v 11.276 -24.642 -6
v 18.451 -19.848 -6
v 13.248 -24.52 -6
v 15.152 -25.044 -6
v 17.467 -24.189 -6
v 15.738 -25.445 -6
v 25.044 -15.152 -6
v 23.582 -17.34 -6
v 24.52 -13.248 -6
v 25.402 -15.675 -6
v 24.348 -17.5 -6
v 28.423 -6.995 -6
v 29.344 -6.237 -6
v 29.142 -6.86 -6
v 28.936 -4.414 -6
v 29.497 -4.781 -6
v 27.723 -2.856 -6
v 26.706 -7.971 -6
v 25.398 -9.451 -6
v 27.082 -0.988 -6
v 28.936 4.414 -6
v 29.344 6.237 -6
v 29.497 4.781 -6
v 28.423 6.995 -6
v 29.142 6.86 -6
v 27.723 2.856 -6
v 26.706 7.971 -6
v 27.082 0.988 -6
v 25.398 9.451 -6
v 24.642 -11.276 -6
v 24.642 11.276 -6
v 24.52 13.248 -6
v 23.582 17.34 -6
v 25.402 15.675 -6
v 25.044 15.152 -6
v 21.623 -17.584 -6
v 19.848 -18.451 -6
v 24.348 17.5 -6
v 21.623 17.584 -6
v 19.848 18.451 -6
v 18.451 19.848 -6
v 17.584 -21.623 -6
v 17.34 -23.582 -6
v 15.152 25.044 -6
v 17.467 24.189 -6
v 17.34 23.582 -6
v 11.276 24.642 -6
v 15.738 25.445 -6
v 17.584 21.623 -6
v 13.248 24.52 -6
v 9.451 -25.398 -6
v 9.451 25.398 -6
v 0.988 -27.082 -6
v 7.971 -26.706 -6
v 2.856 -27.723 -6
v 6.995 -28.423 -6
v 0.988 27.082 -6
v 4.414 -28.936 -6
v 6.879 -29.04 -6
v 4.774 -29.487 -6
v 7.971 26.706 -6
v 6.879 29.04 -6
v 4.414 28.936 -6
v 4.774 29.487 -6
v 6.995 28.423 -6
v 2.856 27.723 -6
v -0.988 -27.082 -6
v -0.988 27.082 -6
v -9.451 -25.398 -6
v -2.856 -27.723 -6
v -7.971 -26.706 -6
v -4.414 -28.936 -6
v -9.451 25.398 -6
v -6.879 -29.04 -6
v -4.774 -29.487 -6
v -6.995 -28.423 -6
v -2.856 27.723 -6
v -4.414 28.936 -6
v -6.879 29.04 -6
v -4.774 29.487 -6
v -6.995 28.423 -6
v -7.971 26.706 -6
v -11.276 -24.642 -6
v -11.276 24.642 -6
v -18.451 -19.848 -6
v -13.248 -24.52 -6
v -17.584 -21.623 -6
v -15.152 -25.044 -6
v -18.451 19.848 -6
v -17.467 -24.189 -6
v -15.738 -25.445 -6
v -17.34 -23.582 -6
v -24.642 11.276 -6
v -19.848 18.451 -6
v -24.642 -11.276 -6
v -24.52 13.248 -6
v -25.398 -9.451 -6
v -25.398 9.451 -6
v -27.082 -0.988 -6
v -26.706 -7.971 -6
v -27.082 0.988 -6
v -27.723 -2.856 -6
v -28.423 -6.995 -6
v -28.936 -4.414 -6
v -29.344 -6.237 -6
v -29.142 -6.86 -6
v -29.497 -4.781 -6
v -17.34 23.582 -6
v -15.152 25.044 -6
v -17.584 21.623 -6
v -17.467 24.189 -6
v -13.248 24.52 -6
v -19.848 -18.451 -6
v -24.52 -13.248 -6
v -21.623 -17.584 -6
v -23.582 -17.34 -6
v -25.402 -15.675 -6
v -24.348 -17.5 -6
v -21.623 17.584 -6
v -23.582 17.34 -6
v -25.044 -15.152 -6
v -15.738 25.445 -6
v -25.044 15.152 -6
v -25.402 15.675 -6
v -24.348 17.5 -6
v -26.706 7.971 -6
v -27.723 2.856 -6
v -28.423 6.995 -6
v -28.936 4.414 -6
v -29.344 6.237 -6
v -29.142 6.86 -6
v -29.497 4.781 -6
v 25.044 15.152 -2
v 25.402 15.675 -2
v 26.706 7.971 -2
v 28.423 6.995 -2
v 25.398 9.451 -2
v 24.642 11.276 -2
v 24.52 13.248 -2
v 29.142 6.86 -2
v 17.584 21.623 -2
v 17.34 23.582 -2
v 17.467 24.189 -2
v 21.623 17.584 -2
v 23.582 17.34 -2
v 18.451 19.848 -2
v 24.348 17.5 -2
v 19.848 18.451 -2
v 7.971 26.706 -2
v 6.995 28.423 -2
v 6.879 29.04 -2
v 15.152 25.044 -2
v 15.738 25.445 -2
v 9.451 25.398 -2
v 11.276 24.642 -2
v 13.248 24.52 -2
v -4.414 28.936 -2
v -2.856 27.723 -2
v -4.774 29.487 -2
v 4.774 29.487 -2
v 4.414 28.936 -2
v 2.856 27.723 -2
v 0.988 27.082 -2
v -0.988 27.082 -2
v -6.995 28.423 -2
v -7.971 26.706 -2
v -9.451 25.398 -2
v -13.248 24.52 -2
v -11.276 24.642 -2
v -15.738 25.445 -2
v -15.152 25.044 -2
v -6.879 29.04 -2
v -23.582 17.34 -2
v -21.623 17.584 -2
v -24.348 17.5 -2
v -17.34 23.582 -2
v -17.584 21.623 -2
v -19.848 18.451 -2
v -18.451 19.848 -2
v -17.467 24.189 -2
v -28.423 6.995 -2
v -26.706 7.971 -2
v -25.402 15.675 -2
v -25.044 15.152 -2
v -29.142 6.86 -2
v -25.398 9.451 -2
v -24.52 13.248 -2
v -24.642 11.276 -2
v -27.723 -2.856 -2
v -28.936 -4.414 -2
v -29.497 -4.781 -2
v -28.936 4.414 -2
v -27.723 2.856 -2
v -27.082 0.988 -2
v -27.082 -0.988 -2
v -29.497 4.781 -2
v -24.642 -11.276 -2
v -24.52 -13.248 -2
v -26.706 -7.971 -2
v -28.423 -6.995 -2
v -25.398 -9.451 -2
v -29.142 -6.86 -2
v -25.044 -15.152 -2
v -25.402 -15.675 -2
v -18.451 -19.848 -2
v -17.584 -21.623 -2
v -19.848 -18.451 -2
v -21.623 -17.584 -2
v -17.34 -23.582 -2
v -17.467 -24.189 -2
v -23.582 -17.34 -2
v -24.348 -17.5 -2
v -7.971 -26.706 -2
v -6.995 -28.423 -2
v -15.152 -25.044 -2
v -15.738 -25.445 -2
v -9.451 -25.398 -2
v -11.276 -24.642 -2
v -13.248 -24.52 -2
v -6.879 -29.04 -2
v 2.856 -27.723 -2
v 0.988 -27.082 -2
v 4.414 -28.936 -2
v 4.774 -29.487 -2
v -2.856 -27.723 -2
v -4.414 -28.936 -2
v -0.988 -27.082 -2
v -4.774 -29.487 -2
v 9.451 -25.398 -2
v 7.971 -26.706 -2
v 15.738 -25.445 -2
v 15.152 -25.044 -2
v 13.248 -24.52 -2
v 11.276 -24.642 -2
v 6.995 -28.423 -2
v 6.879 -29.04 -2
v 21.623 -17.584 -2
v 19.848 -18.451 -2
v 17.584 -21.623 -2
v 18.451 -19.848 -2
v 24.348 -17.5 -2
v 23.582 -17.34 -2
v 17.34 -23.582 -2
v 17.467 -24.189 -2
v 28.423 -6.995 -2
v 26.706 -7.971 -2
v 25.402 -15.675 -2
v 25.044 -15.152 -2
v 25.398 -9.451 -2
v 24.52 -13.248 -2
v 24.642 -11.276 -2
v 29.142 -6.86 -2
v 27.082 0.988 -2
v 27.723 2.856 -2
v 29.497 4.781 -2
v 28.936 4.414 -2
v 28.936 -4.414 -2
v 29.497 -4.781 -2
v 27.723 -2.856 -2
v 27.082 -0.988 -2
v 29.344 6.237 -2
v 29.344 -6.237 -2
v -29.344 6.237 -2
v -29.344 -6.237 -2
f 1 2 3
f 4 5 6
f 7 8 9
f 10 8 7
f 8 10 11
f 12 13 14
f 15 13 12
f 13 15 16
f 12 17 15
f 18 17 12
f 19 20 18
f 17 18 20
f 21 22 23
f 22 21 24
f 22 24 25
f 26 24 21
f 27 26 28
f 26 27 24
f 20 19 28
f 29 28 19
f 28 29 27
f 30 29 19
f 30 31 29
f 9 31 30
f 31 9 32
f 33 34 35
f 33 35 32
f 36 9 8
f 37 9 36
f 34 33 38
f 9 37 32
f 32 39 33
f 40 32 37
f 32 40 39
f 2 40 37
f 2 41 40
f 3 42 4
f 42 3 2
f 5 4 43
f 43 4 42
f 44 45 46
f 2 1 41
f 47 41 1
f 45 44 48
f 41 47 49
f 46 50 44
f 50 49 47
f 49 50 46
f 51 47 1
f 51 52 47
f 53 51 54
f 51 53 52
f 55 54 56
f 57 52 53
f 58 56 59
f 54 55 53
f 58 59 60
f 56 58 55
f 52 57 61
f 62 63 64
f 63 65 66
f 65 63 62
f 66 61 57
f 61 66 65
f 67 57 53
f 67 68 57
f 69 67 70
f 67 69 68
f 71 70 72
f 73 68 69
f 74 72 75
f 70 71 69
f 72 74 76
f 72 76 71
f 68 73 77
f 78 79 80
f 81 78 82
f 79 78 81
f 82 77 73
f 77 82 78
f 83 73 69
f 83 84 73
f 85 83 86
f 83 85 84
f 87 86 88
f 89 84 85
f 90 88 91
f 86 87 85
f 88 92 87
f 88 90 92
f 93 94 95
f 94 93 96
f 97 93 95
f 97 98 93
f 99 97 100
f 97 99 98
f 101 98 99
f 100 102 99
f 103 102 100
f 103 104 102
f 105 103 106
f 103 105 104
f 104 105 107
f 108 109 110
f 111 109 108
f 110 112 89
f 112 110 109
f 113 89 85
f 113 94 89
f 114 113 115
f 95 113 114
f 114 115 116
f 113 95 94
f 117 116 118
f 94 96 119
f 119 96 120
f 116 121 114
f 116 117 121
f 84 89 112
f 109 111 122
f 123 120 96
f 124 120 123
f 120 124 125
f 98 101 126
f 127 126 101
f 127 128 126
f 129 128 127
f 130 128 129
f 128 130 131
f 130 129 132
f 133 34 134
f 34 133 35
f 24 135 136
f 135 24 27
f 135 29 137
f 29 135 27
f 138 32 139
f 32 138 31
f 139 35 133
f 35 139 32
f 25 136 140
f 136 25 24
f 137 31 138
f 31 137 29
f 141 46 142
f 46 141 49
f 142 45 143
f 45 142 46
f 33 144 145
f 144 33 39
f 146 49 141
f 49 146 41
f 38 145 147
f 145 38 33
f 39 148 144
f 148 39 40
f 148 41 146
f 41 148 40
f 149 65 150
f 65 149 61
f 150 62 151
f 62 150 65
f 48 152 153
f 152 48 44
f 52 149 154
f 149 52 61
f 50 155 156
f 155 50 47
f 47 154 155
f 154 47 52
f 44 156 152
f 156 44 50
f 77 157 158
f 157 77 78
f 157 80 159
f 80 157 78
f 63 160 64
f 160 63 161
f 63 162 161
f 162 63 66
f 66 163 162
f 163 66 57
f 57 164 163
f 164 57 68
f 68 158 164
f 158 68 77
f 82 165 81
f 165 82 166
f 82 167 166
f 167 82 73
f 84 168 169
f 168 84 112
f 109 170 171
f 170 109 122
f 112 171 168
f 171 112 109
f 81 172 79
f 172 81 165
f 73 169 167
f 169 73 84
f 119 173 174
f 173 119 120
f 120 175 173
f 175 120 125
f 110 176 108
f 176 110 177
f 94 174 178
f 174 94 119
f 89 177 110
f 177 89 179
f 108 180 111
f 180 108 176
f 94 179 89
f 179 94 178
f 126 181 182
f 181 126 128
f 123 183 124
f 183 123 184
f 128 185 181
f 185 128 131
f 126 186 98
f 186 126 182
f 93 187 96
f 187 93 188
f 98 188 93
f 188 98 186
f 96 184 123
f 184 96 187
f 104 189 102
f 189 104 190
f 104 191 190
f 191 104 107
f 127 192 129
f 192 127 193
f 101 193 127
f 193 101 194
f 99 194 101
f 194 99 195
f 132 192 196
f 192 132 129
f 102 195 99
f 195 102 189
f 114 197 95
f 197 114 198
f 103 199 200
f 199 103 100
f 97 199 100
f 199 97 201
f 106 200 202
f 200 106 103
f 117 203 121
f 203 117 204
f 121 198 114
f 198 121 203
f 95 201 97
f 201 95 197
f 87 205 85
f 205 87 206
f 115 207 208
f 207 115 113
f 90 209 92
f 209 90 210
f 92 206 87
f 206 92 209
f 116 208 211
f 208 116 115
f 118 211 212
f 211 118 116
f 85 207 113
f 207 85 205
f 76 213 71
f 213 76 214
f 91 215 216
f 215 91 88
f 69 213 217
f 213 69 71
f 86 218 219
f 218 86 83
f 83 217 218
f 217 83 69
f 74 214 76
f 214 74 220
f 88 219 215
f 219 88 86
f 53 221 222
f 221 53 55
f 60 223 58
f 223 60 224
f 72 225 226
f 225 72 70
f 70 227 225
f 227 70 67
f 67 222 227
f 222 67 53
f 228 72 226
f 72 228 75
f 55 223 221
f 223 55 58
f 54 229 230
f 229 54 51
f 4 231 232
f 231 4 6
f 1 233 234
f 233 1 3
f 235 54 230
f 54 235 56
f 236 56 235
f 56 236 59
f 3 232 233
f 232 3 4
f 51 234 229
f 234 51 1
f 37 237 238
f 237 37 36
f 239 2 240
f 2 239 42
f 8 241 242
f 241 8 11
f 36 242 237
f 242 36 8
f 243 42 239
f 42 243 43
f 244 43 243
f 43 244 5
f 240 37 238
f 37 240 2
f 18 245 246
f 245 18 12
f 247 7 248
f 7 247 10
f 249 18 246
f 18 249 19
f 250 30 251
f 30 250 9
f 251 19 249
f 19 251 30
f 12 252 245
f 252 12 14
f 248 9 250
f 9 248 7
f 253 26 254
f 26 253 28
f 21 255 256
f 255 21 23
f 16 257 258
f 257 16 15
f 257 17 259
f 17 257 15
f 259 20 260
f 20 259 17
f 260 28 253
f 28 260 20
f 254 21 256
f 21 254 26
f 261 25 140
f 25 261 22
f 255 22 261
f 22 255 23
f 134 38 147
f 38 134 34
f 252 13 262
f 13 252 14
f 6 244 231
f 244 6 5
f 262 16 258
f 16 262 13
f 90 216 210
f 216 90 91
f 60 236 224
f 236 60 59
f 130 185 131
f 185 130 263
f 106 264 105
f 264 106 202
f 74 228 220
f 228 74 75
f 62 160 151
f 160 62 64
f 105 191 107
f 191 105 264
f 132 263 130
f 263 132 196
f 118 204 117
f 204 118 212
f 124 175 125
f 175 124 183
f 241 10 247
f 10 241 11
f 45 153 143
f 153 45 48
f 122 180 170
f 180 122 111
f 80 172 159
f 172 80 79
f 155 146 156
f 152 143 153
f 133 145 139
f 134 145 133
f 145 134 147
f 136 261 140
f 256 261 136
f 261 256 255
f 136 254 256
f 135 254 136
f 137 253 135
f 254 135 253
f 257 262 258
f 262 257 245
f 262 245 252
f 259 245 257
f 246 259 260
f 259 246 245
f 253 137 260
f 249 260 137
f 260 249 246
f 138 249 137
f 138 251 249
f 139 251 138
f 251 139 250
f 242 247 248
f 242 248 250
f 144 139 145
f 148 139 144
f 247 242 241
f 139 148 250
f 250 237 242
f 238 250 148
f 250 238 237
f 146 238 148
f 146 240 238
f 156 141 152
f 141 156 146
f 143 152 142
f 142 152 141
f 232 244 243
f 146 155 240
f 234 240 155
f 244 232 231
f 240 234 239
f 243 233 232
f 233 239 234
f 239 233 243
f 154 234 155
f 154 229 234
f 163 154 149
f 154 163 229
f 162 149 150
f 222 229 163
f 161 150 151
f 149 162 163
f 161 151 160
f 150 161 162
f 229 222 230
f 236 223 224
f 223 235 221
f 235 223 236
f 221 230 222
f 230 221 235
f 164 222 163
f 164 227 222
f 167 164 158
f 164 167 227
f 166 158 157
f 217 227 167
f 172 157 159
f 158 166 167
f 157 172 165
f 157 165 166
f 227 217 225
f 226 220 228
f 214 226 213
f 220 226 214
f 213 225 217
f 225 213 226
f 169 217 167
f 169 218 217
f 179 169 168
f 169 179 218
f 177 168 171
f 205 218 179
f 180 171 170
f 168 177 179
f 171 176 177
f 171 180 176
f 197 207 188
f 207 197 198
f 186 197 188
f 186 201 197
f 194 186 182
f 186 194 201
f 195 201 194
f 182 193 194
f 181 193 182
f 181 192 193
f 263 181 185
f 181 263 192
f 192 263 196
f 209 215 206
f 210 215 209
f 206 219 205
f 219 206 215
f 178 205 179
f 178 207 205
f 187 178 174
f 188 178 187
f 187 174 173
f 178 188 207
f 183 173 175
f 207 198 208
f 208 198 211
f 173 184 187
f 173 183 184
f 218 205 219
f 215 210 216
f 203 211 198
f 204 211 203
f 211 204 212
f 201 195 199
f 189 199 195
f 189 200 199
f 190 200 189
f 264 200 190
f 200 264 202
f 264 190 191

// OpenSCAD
module knob(sides, height, radius, toothradius) {
  difference() {
    cylinder(r1=radius, r2=radius, h=height, center=true);
    for (i = [1:sides]) {
      rotate([0, 0, i * 360/sides]) {
        translate([radius + toothradius / 2, 0, 0]) {
          cylinder(r1=toothradius, r2=toothradius, h=height, center=true);
        }
      }
    }
  }
}

difference() {
  knob(16, 12, 30, 6);
  translate([0, 0, 4]) {
    knob(16, 12, 30, 6);
  }
}
